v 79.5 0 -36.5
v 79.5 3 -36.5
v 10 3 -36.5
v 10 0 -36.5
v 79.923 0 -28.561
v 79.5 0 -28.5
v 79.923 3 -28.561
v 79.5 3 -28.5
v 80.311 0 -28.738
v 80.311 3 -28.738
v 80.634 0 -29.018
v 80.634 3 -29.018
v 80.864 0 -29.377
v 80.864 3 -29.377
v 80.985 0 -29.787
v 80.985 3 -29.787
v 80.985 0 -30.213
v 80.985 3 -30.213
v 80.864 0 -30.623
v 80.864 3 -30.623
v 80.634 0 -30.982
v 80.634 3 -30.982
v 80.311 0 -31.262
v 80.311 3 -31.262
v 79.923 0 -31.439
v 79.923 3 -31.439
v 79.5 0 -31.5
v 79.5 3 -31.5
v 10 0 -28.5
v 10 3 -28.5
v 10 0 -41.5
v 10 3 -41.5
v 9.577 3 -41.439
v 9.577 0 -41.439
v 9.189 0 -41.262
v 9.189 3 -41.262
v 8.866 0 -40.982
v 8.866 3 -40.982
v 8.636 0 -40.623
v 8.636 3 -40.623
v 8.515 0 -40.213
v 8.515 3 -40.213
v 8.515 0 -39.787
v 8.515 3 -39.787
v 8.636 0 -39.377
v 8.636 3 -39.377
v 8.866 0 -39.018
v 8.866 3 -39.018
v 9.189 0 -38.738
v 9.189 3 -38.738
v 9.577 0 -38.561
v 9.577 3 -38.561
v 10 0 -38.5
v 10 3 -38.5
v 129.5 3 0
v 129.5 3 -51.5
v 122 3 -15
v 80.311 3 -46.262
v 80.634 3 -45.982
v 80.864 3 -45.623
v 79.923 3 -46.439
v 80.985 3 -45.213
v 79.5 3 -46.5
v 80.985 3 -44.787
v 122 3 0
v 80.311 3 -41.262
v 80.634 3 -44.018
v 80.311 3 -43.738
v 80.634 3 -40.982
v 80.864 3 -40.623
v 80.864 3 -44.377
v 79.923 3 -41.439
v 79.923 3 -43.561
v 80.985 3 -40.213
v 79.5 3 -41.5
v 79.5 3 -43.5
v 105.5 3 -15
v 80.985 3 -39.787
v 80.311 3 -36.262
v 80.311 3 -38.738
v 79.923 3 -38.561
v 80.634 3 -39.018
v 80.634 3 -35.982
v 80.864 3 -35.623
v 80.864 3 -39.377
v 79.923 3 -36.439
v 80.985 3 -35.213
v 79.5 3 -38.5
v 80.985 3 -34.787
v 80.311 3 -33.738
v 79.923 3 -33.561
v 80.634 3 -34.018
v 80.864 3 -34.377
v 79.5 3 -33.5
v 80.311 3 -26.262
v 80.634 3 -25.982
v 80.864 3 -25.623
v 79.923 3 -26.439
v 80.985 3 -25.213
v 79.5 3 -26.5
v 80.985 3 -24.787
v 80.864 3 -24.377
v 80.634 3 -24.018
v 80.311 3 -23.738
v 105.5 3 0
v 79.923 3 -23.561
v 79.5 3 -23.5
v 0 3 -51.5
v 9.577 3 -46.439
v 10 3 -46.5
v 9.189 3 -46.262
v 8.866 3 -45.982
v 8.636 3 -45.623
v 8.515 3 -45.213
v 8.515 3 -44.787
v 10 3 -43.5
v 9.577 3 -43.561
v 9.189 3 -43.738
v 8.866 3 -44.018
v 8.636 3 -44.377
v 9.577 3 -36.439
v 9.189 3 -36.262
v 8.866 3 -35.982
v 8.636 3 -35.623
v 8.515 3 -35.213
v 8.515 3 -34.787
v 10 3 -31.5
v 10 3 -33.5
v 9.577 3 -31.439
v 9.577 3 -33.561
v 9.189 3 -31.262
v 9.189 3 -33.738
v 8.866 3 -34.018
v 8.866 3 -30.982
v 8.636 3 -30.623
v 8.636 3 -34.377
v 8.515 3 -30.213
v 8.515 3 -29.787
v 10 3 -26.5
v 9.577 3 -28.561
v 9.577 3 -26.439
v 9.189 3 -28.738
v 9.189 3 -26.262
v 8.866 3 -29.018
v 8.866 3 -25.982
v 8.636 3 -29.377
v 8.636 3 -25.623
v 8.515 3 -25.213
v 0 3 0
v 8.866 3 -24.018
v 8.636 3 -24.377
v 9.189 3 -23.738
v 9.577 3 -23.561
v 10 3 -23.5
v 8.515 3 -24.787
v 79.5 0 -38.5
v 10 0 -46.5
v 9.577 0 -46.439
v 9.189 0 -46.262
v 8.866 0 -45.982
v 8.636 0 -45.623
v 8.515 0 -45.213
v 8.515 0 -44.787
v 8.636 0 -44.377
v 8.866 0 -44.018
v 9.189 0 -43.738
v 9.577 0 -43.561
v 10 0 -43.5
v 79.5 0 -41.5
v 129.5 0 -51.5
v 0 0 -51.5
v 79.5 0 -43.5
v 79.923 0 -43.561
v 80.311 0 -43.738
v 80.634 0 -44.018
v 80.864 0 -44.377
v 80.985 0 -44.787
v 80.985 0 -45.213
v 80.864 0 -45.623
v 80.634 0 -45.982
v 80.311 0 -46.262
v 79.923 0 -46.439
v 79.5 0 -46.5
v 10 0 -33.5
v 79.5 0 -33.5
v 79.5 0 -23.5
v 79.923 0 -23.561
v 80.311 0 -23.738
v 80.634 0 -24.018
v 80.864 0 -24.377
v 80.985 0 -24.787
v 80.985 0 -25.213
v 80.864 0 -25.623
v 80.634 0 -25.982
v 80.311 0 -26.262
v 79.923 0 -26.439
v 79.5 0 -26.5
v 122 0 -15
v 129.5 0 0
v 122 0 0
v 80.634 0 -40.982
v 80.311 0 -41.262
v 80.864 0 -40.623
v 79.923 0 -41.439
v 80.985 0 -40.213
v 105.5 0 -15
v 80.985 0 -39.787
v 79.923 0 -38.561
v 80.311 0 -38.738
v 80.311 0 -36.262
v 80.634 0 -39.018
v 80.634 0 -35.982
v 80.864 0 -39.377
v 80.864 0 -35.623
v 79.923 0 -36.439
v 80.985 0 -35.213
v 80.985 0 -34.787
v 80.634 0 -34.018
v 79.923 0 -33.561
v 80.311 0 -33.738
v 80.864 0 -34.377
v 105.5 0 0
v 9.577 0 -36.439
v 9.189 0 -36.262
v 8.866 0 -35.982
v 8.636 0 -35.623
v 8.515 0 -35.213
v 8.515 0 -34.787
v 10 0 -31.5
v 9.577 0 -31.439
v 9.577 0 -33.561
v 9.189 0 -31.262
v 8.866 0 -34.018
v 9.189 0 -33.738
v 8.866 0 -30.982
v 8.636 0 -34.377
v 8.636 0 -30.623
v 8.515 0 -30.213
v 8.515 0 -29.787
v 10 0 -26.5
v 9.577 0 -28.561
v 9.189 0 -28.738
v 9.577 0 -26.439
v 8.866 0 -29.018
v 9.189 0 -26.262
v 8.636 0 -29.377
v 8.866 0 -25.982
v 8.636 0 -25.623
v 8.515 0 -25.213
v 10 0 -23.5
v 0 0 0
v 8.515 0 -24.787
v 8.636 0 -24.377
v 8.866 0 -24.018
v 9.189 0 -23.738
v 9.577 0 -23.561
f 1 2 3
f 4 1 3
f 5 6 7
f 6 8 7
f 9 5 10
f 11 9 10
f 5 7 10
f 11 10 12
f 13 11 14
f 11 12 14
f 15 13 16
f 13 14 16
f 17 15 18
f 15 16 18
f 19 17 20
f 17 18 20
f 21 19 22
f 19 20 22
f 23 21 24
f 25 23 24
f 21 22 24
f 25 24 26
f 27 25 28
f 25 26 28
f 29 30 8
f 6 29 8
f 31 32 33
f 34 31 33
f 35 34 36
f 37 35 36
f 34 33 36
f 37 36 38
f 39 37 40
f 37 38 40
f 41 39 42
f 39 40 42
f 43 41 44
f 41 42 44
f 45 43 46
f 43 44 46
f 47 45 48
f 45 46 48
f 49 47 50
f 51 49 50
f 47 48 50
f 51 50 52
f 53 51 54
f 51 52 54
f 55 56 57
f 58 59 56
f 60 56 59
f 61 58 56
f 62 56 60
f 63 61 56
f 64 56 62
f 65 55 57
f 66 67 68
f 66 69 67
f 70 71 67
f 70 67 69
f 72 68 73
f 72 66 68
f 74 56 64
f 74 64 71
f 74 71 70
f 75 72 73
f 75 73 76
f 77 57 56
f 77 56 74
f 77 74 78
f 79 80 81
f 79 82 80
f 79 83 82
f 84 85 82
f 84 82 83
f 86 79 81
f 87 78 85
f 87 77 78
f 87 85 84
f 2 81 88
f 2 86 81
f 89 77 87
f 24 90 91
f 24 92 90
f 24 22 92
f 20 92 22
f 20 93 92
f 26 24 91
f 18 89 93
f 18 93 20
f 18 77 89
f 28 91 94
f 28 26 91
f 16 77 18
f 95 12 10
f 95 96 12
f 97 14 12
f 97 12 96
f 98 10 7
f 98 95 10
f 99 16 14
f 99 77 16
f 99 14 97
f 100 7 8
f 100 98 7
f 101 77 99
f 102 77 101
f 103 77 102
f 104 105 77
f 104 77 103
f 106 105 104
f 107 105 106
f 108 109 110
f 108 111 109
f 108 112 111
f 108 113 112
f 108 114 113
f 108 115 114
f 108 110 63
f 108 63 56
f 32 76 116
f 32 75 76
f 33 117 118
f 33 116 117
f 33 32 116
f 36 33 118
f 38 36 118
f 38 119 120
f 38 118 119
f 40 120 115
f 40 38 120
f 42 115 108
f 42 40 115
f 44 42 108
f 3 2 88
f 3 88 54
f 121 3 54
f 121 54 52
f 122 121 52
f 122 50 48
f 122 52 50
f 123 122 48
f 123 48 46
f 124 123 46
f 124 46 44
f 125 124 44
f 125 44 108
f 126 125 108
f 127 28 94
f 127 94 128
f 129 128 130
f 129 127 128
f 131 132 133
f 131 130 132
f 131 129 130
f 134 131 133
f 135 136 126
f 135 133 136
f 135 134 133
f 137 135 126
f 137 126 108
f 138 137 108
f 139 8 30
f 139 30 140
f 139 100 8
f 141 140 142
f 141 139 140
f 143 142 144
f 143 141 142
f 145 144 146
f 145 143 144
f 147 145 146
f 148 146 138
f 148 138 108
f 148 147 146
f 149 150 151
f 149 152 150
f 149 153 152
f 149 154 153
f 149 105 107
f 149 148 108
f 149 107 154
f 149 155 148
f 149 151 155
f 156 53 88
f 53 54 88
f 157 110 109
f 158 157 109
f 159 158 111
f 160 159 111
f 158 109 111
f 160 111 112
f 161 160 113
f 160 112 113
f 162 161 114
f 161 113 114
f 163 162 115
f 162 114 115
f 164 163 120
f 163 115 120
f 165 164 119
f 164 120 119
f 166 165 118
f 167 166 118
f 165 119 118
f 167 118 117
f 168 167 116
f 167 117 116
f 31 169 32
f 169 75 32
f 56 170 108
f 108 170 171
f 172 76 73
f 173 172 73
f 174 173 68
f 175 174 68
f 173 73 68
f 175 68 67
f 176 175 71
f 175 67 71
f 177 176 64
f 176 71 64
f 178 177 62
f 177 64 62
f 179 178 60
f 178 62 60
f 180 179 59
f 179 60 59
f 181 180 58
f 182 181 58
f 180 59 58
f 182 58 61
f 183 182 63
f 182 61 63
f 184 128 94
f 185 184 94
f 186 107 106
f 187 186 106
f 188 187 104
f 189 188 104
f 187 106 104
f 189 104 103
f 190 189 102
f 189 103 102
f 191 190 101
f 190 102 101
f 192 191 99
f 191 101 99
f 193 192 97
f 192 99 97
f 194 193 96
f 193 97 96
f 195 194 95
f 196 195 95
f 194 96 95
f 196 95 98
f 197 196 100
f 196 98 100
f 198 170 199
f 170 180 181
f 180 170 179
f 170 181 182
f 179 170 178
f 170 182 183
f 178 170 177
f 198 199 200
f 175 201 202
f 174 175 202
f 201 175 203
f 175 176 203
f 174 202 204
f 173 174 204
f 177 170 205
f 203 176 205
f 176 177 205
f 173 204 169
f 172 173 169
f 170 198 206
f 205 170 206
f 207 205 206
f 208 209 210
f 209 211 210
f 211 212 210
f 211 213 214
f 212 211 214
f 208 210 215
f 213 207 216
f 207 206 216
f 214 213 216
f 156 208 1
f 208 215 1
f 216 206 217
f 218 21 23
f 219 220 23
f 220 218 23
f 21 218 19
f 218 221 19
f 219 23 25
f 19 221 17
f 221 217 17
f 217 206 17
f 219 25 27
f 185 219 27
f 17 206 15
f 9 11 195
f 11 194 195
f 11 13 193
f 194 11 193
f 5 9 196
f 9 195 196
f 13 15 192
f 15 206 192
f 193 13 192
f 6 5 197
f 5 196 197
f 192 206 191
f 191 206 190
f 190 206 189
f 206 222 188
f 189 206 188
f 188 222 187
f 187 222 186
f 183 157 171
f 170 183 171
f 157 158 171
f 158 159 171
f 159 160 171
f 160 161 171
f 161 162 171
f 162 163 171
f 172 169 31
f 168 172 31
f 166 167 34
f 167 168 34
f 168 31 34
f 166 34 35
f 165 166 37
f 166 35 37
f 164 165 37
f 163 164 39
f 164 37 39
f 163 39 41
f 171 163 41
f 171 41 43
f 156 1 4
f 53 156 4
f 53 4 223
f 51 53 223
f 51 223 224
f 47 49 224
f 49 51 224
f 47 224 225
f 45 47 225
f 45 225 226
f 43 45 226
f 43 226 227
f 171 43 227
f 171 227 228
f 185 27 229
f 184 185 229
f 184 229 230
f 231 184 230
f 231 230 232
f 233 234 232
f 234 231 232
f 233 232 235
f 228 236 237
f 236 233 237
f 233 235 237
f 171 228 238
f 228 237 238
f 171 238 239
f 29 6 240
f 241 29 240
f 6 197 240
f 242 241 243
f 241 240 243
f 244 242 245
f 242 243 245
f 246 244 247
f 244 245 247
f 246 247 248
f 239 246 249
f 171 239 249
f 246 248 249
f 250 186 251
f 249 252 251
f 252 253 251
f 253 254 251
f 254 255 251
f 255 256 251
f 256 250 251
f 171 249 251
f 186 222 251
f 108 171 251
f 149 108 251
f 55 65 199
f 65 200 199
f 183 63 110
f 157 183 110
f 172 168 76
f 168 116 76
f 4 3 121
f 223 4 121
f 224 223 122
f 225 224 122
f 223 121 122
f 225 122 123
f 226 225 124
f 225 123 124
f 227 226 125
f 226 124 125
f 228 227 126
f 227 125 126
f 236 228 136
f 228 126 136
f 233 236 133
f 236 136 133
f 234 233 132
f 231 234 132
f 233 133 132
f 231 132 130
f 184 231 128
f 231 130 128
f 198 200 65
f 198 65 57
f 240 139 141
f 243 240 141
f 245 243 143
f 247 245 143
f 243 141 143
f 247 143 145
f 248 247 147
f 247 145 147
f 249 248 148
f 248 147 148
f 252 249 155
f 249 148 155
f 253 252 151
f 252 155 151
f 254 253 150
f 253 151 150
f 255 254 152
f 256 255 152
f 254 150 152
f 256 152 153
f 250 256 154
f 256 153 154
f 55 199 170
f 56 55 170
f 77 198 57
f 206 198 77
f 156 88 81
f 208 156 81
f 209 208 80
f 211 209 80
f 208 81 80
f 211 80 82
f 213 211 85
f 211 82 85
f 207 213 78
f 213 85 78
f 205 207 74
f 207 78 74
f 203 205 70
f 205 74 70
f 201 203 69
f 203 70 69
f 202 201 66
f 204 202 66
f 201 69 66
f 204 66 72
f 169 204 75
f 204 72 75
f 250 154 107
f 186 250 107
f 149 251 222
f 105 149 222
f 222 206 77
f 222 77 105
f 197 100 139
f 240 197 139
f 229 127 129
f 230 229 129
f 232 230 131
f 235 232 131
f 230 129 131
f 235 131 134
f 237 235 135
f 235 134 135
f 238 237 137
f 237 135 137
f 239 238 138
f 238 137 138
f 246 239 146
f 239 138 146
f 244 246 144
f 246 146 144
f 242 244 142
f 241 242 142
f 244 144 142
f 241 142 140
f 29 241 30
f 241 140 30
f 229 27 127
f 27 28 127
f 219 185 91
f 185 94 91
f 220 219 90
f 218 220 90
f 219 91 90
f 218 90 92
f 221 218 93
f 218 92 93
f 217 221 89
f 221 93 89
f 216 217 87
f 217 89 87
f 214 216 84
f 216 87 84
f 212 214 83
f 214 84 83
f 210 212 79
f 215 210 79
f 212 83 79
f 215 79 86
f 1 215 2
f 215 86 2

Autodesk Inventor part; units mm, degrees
ref_plane "YZ Plane" through (0, 0, 0) normal (1, 0, 0) x (0, 1, 0)
ref_plane "XZ Plane" through (0, 0, 0) normal (0, 1, 0) x (-1, 0, 0)
ref_plane "XY Plane" through (0, 0, 0) normal (0, 0, 1) x (1, 0, 0)
sketch "Skizze1" plane through (0, 0, 0) normal (0, 1, 0) x (-1, 0, 0)
  line L0 (0, 0) -> (-129.5, 0)
  line L1 (-129.5, 0) -> (-129.5, -51.5)
  line L2 (-129.5, -51.5) -> (0, -51.5)
  line L3 (0, -51.5) -> (0, 0)
  line L4 (-122, 0) -> (-122, -15)
  line L5 (-122, -15) -> (-105.5, -15)
  line L6 (-105.5, -15) -> (-105.5, 0)
  dimension "d0" = 129.5
  dimension "d1" = 51.5
  dimension "d4" = 16.5
  dimension "d5" = 7.5
  dimension "d6" = 15
extrude "Extrusion1" add sketch "Skizze1" along normal blind 3 contours L3 L2 L1 L0 L4 L5 L6
sketch "Skizze2" plane through (0, 3, 0) normal (0, 1, 0) x (1, 0, 0)
  line L0 (10, 45) -> (79.5, 45) construction
  line L1 (10, 43.5) -> (79.5, 43.5)
  line L2 (79.5, 46.5) -> (10, 46.5)
  arc A0 (10, 46.5) -> (10, 43.5) centre (10, 45) ccw
  arc A1 (79.5, 43.5) -> (79.5, 46.5) centre (79.5, 45) ccw
  line L3 (0, 0) -> (105.5, 0) projected
  line L4 (105.5, 0) -> (105.5, 15) projected
  line L5 (105.5, 15) -> (122, 15) projected
  line L6 (122, 15) -> (122, 0) projected
  line L7 (122, 0) -> (129.5, 0) projected
  line L8 (129.5, 0) -> (129.5, 51.5) projected
  line L9 (129.5, 51.5) -> (0, 51.5) projected
  line L10 (0, 51.5) -> (0, 0) projected
  point P0 (44.75, 45)
  dimension "d7" = 5
  dimension "d8" = 10
  dimension "d9" = 50
  dimension "d10" = 1.5
extrude "Extrusion2" cut sketch "Skizze2" against normal through all contours A0 L2 A1 L1
pattern_linear "Rechteckige Anordnung1" count 5 spacing 5 along (0, 0, 1) of "Extrusion2"
properties part number "wood_front"
